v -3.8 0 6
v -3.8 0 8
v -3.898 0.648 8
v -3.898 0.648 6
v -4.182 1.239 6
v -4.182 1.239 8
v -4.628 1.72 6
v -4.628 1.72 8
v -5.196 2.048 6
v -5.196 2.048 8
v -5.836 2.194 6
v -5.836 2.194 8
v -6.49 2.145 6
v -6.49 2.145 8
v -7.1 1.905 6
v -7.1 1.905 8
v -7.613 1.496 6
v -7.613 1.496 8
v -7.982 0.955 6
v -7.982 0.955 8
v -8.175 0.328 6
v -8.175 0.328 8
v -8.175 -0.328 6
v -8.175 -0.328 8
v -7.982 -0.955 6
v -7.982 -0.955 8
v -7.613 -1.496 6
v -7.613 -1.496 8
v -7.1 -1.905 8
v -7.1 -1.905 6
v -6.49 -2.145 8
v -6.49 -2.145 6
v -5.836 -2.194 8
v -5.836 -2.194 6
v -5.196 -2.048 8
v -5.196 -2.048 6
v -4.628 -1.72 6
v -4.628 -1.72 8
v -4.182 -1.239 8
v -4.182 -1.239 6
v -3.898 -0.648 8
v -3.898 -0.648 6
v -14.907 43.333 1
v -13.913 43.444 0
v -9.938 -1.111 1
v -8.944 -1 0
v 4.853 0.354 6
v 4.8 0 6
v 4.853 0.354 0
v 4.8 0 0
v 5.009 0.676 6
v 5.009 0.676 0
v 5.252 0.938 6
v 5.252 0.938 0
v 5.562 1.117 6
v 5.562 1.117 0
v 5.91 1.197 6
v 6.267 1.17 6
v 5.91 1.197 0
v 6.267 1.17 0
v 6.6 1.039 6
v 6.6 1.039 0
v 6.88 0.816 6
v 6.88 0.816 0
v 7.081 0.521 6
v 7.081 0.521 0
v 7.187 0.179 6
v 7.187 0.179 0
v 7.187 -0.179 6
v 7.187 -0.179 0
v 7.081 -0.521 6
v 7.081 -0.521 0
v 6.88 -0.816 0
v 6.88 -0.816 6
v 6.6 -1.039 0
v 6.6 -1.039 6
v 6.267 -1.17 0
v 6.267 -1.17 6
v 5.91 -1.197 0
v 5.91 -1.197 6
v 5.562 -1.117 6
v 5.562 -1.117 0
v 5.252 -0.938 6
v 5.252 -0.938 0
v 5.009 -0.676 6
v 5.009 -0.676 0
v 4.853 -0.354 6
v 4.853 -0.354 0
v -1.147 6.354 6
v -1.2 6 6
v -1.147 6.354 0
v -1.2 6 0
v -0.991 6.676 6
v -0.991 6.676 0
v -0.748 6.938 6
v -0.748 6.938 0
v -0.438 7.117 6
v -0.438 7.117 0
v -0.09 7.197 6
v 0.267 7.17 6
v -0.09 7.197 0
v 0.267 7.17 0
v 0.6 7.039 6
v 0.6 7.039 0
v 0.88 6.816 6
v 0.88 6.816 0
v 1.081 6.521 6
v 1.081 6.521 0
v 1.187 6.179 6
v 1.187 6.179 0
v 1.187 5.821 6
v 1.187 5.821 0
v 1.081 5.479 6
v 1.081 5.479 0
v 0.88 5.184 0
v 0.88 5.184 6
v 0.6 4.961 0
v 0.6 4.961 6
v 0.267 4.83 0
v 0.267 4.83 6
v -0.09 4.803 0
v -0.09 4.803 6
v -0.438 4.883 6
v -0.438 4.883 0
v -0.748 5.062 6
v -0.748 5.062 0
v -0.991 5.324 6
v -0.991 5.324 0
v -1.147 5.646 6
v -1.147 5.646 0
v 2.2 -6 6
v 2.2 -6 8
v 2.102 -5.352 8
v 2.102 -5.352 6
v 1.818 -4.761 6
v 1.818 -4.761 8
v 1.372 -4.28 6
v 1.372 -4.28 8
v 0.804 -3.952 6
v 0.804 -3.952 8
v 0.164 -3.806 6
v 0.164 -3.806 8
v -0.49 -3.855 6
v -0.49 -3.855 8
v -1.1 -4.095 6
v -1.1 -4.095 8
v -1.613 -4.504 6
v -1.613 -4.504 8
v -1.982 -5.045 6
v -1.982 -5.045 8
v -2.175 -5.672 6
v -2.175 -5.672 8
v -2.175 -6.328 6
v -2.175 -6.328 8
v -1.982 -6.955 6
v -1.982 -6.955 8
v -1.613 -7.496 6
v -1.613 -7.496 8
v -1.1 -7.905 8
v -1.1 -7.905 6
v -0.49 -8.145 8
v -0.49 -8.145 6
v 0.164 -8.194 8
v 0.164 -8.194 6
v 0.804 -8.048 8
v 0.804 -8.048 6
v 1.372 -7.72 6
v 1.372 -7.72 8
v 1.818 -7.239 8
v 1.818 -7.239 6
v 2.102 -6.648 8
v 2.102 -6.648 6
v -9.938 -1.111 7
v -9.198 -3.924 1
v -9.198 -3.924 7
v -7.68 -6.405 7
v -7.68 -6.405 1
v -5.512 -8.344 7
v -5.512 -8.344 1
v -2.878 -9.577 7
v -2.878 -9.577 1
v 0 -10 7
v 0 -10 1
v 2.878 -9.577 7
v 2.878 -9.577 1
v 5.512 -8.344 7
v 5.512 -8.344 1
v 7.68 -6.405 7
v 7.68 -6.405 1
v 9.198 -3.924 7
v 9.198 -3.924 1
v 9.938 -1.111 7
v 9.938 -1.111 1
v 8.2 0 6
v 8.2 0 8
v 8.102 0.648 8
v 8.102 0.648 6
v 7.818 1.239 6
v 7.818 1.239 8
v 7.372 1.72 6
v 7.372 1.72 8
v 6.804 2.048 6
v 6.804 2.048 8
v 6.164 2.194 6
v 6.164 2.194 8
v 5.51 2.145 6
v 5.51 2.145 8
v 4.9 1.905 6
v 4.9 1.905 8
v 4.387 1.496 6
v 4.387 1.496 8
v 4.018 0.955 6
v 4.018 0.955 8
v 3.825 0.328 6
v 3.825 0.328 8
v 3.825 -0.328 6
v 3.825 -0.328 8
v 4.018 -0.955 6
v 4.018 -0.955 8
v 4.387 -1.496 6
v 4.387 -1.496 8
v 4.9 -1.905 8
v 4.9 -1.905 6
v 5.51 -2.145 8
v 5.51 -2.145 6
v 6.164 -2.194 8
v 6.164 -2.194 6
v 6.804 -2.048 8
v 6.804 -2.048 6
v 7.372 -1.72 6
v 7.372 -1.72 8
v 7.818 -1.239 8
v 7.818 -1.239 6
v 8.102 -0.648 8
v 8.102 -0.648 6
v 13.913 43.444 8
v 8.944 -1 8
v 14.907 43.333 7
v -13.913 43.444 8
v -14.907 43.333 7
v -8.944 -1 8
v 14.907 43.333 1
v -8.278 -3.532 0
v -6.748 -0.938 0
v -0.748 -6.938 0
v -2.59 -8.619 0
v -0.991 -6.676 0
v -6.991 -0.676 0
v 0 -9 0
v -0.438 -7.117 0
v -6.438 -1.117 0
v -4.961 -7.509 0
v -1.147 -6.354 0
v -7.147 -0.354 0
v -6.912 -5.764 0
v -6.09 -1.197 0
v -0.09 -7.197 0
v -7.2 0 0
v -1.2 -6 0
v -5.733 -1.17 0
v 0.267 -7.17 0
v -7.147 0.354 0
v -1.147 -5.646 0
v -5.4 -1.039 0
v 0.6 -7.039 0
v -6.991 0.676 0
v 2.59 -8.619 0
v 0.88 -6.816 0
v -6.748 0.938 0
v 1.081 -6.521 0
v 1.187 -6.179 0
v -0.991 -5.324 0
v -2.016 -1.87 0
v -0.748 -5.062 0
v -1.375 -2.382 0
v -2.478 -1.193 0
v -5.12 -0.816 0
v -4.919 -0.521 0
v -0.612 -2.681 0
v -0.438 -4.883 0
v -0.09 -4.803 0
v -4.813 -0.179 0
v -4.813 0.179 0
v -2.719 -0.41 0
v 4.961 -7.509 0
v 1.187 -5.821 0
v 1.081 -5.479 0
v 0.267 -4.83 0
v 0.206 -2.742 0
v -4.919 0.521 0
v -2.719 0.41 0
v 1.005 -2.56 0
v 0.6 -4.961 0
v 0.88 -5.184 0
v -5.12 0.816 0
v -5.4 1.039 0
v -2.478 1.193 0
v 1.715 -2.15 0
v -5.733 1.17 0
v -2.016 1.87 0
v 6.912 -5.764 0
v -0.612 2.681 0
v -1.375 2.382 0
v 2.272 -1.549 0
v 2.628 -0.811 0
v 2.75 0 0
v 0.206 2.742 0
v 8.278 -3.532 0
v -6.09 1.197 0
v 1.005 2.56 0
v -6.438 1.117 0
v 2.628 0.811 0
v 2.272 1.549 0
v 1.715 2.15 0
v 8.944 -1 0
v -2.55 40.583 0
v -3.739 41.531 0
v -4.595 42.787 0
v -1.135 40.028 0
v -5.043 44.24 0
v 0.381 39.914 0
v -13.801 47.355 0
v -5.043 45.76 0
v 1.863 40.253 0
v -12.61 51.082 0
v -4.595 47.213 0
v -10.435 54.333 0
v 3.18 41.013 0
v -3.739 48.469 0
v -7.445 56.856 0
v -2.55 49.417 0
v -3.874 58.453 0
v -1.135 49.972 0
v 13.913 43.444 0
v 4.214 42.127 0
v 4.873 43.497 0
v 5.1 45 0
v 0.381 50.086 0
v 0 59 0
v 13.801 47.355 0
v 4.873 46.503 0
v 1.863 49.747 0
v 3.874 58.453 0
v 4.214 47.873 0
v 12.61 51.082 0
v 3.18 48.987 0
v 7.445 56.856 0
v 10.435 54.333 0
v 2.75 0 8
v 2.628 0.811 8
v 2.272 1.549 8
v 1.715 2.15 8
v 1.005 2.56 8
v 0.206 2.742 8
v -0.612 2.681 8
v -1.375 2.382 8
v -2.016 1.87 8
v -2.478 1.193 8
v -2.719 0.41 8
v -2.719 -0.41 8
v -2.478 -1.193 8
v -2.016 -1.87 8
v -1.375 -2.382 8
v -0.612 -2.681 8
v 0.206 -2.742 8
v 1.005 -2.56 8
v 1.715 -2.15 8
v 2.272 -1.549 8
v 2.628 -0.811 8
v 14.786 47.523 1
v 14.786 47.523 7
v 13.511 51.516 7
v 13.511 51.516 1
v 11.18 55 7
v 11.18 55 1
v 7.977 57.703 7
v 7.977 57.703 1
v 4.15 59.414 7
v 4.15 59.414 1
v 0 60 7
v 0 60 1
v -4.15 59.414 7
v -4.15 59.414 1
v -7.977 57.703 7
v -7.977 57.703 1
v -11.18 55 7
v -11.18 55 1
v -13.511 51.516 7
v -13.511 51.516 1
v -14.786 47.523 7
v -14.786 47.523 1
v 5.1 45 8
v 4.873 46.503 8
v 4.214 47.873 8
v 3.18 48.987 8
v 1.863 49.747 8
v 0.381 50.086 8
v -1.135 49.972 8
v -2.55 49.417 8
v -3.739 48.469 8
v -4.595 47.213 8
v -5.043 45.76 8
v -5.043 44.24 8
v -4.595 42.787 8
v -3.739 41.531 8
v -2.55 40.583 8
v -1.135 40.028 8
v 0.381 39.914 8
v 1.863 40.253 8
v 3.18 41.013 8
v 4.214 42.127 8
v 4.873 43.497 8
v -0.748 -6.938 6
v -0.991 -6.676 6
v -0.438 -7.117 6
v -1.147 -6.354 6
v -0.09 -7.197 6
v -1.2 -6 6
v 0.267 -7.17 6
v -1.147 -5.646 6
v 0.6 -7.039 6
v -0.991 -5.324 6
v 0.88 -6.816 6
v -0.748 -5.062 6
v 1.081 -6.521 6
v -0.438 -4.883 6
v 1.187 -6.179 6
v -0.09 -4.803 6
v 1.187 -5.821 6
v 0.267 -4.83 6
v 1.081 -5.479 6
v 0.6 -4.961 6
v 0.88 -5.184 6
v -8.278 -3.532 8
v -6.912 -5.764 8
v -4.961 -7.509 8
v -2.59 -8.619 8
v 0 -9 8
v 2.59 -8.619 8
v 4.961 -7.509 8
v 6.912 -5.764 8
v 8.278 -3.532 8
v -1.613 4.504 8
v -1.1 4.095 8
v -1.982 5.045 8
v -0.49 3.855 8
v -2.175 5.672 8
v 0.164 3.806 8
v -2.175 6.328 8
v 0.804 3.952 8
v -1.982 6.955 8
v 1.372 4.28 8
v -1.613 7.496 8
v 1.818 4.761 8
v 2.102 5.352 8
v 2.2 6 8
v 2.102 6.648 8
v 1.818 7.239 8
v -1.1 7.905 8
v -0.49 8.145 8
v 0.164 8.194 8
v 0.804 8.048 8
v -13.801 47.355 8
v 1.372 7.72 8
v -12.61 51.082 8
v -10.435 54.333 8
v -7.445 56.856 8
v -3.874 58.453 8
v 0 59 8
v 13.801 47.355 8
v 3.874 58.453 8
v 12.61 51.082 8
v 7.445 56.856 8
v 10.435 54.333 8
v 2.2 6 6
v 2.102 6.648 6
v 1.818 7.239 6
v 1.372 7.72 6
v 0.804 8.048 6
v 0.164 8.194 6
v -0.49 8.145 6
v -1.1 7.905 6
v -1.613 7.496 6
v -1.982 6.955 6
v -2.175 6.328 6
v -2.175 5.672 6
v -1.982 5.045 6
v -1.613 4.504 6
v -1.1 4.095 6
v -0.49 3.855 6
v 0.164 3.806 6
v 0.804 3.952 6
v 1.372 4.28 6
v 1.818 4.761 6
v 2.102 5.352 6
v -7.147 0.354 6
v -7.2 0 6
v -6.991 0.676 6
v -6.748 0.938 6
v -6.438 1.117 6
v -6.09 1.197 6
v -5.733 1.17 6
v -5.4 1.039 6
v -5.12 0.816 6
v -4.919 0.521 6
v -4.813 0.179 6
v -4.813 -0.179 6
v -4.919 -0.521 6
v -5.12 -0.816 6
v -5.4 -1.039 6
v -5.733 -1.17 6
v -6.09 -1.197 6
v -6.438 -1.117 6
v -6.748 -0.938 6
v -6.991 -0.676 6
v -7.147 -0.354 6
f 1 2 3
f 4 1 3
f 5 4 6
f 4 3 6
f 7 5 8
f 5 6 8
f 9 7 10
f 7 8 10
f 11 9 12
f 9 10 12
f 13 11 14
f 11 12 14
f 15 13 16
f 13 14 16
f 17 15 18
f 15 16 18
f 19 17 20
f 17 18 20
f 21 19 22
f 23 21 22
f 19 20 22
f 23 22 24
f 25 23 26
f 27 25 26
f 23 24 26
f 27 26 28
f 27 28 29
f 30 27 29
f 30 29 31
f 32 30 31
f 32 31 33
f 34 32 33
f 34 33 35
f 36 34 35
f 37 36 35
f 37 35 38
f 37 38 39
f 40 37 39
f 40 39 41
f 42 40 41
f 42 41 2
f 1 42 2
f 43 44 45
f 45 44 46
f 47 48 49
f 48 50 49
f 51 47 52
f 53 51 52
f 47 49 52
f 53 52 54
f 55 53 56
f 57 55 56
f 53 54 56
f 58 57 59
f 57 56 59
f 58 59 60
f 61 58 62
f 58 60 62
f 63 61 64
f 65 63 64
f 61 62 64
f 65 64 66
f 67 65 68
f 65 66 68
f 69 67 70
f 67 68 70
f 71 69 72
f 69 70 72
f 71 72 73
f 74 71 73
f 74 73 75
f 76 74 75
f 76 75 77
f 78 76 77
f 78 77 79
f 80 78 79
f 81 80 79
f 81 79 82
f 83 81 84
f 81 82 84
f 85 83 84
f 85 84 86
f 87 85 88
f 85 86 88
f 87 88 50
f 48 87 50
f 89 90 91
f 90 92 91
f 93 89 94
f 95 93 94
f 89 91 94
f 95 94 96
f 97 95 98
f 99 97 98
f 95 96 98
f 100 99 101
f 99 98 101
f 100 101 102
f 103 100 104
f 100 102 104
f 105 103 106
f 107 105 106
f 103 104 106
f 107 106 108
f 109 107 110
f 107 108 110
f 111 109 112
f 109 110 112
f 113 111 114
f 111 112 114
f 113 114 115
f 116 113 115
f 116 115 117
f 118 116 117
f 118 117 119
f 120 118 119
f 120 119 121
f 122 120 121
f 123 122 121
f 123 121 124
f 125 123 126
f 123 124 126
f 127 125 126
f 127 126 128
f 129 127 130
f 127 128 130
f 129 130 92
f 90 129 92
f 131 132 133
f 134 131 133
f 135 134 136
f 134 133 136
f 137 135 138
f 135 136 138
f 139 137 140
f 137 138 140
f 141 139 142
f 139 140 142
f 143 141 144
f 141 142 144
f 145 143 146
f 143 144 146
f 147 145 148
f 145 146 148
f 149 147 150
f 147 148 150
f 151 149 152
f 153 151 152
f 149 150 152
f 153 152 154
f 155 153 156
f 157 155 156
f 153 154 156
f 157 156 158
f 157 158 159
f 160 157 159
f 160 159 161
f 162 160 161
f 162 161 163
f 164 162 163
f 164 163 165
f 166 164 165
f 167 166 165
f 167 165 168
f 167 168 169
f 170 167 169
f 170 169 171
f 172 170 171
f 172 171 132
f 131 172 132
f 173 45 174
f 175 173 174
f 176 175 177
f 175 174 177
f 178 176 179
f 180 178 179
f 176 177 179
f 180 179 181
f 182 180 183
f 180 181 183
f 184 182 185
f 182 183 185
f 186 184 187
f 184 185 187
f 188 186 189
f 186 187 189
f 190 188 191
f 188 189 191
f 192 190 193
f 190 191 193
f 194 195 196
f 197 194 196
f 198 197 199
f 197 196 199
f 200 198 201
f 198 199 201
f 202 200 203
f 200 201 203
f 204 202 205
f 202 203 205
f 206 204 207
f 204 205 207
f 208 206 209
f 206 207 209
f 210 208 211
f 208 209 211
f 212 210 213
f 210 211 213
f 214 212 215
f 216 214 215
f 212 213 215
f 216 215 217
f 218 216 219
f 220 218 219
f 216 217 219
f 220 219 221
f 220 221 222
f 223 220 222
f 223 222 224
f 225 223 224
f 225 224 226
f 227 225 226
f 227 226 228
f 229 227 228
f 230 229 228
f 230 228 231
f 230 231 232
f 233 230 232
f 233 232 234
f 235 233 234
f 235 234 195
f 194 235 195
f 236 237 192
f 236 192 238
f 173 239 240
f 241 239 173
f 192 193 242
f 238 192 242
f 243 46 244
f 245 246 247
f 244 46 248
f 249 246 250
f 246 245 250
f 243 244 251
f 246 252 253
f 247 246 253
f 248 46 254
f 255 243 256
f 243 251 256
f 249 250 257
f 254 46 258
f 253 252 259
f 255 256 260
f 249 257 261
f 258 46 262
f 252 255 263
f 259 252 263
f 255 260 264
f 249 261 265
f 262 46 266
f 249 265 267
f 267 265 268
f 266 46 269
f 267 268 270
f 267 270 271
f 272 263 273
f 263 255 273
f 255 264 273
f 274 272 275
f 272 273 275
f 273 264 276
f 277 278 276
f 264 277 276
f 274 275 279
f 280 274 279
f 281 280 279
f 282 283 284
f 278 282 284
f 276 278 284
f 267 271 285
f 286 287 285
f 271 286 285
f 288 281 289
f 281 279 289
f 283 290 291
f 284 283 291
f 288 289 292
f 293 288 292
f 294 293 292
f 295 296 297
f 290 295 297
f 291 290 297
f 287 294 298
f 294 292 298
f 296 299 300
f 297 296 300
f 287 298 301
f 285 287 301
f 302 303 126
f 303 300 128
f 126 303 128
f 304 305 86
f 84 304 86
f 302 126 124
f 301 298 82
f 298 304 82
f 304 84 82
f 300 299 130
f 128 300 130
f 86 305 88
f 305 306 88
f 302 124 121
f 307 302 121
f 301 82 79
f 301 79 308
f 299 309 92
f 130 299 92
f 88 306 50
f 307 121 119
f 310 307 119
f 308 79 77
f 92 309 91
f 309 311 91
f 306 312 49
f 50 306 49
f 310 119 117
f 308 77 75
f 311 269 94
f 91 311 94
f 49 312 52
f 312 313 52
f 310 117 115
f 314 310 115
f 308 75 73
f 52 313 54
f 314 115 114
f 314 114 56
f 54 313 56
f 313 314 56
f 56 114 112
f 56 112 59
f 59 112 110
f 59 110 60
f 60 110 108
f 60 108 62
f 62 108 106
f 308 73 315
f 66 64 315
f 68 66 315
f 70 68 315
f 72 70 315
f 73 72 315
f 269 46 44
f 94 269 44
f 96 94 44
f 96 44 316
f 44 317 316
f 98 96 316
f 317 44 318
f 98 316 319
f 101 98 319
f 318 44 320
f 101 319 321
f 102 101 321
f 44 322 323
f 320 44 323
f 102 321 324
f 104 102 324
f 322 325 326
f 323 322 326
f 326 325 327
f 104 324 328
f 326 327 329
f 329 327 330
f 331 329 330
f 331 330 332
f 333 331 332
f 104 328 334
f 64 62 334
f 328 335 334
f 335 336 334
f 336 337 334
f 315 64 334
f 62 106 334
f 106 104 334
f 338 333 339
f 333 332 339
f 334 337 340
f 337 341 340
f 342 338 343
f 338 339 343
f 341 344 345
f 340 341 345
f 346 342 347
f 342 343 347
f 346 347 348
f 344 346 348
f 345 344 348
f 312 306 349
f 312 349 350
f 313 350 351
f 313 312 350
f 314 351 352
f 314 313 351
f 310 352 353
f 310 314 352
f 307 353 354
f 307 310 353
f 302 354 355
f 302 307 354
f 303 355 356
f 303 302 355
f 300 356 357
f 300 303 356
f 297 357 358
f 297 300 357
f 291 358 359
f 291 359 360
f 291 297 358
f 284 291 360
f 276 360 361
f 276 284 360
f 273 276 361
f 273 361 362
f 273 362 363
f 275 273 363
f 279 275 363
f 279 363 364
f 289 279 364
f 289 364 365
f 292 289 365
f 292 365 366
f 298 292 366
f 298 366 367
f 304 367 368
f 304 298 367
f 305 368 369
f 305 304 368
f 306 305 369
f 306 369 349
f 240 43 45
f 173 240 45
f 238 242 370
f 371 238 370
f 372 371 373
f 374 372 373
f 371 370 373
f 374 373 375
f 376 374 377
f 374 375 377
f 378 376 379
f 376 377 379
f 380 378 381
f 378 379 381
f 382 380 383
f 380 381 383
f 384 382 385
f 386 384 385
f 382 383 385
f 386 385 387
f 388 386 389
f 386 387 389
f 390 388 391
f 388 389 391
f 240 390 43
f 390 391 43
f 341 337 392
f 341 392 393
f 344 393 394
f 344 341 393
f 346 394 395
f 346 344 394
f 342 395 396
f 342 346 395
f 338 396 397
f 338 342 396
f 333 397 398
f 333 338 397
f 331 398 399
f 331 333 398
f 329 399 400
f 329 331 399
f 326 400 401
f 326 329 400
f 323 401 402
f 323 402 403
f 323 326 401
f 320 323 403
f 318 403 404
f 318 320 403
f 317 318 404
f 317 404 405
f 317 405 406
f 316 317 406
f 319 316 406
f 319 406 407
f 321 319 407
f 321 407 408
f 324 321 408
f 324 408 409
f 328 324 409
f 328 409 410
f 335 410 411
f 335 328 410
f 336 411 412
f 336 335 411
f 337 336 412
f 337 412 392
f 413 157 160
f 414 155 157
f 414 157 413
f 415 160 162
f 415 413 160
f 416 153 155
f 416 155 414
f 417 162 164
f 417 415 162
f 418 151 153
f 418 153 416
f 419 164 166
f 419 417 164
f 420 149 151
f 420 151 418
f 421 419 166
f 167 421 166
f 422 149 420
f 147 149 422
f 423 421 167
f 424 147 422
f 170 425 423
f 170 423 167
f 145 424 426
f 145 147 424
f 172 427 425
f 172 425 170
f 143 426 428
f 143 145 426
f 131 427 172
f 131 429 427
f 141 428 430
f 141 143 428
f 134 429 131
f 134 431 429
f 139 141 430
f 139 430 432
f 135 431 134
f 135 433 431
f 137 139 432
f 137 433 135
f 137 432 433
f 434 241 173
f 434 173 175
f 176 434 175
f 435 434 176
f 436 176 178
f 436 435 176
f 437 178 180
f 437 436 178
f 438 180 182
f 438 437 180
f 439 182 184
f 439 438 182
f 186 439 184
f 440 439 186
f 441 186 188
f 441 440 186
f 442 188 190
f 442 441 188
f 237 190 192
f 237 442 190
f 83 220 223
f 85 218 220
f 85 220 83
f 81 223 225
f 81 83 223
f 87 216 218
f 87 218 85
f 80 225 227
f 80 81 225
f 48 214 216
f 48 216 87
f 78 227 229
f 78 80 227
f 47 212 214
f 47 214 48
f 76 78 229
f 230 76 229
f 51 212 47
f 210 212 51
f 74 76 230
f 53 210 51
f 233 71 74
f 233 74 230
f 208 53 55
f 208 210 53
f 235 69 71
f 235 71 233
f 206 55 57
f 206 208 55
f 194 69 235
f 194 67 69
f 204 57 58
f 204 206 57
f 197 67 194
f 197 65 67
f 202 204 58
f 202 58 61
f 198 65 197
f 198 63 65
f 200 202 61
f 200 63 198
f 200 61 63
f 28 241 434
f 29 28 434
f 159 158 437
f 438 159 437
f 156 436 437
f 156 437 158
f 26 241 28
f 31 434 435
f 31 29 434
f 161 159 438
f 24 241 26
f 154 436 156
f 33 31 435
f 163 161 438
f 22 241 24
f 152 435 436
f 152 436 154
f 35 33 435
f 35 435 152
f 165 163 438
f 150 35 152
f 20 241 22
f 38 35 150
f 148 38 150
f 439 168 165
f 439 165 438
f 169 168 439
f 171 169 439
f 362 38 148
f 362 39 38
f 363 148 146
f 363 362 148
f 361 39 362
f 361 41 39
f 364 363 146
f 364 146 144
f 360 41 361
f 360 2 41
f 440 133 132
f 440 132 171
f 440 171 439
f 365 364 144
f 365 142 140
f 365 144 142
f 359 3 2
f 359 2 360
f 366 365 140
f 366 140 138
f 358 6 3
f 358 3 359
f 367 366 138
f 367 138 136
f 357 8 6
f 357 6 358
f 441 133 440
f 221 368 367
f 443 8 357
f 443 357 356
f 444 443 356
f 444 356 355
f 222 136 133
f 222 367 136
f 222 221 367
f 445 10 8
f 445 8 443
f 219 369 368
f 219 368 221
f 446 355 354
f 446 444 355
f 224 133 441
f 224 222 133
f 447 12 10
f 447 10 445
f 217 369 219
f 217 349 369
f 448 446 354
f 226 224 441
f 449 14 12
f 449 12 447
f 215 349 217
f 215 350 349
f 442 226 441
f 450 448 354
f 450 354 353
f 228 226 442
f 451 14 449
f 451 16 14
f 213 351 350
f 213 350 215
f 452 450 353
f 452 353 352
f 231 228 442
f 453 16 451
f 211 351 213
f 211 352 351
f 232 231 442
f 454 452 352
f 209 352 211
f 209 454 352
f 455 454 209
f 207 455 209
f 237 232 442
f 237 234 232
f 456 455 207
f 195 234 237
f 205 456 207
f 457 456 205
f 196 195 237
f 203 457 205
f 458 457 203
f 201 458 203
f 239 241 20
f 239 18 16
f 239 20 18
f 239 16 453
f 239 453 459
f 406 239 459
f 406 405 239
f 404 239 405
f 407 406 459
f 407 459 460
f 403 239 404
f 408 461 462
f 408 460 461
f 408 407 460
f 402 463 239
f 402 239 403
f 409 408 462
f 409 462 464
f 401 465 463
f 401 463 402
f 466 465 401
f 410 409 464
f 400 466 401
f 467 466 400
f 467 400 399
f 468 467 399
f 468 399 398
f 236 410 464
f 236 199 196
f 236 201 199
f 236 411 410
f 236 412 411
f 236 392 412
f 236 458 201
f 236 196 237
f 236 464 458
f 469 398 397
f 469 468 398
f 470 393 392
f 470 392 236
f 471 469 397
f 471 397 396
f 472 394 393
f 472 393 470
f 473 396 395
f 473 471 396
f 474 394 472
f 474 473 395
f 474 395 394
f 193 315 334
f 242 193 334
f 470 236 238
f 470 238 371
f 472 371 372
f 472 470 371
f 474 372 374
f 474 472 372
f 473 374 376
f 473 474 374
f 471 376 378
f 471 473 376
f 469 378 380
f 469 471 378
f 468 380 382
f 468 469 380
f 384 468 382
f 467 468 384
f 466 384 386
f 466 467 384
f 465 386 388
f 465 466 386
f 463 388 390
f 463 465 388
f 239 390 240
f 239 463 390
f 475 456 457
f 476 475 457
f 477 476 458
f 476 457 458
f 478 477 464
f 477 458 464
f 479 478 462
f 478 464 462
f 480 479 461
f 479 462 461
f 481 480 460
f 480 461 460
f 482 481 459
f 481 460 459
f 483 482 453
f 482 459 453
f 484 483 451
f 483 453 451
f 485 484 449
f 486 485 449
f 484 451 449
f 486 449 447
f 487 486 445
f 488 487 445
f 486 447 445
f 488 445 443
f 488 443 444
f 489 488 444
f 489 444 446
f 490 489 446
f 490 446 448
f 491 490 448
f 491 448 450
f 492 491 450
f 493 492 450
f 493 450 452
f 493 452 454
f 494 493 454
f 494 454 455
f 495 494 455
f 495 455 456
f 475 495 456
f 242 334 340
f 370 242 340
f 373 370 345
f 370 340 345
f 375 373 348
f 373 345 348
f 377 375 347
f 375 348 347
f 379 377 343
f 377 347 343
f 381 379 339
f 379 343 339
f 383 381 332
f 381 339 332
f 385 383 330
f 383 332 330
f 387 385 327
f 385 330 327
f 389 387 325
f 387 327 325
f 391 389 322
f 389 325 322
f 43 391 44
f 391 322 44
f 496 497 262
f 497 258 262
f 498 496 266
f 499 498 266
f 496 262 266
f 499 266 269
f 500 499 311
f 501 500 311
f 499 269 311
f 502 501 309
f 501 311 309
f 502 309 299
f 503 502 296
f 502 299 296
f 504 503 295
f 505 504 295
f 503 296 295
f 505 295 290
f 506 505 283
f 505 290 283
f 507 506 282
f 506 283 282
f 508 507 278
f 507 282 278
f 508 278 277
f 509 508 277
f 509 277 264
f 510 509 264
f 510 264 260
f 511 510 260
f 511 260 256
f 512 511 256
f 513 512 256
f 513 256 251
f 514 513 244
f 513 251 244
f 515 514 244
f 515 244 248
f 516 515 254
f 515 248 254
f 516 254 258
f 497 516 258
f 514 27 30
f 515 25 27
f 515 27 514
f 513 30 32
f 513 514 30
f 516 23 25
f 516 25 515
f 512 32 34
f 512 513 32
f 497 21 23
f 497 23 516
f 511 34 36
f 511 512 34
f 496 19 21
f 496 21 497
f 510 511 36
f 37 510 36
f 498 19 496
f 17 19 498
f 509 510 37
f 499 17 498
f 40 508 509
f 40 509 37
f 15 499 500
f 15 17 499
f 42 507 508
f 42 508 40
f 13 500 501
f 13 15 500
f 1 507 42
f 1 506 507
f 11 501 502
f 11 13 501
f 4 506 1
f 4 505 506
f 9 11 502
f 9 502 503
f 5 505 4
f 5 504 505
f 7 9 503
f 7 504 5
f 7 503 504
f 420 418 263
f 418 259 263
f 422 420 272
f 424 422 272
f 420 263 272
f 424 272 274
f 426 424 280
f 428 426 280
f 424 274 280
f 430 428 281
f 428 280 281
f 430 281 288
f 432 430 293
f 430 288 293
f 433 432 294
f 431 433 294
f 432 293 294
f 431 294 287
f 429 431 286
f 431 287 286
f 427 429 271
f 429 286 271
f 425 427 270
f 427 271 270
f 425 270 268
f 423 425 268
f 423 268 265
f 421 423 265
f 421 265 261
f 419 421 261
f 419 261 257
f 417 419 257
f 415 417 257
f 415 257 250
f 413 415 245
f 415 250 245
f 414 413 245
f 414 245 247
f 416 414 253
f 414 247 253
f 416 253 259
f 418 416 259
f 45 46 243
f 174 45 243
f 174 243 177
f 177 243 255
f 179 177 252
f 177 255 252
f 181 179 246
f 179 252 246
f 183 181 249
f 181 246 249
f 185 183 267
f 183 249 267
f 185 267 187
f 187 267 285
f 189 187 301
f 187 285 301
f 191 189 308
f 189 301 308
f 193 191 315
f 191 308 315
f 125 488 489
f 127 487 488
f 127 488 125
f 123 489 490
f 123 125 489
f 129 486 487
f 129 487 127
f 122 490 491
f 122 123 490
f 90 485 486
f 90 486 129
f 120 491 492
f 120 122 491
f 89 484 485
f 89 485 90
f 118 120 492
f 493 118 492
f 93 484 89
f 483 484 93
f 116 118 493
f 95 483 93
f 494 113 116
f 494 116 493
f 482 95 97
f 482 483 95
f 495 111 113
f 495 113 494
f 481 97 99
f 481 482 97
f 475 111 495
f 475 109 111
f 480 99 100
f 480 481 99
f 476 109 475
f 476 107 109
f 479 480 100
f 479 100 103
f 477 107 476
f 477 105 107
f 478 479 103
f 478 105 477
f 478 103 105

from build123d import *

# Parameters (mm, degrees)
SKETCH1_R                      = 2.75
SKETCH1_R_2                    = 5.1
BOSS_EXTRUDE1_DEPTH            = 8
CBORE_FOR_M2_SHCS1_D           = 2.4
CBORE_FOR_M2_SHCS1_CBORE_D     = 4.4
CBORE_FOR_M2_SHCS1_CBORE_DEPTH = 2
CHAMFER1_SIZE                  = 1


with BuildPart() as part:
    # Sketch1 → Boss-Extrude1 (new body)
    with BuildSketch(Plane.XY):
        with BuildLine():
            Line((9.9380799, -1.111111111), (14.90711985, 43.333333333))
            ThreePointArc((14.90711985, 43.333333333), (0, 60), (-14.90711985, 43.333333333))
            Line((-14.90711985, 43.333333333), (-9.9380799, -1.111111111))
            ThreePointArc((-9.9380799, -1.111111111), (0, -10), (9.9380799, -1.111111111))
        make_face()
        Circle(SKETCH1_R, mode=Mode.SUBTRACT)
        with Locations((0, 45)):
            Circle(SKETCH1_R_2, mode=Mode.SUBTRACT)
    extrude(amount=BOSS_EXTRUDE1_DEPTH)

    # CBORE for M2 SHCS1 (through all)
    with Locations(Plane.XY.offset(8)):
        with Locations((0, -6), (-6, 0), (0, 6), (6, 0)):
            CounterBoreHole(CBORE_FOR_M2_SHCS1_D / 2, CBORE_FOR_M2_SHCS1_CBORE_D / 2, CBORE_FOR_M2_SHCS1_CBORE_DEPTH)

    # Chamfer1
    chamfer1_edges = [part.edges().sort_by_distance(p)[0] for p in [
        (12.422599875, 21.111111111, 8),
        (0, 60, 8),
        (-12.422599875, 21.111111111, 8),
        (0, -10, 8),
        (0, -10, 0),
        (-12.422599875, 21.111111111, 0),
        (0, 60, 0),
        (12.422599875, 21.111111111, 0),
    ]]
    chamfer(chamfer1_edges, length=CHAMFER1_SIZE)


solid = part.part
